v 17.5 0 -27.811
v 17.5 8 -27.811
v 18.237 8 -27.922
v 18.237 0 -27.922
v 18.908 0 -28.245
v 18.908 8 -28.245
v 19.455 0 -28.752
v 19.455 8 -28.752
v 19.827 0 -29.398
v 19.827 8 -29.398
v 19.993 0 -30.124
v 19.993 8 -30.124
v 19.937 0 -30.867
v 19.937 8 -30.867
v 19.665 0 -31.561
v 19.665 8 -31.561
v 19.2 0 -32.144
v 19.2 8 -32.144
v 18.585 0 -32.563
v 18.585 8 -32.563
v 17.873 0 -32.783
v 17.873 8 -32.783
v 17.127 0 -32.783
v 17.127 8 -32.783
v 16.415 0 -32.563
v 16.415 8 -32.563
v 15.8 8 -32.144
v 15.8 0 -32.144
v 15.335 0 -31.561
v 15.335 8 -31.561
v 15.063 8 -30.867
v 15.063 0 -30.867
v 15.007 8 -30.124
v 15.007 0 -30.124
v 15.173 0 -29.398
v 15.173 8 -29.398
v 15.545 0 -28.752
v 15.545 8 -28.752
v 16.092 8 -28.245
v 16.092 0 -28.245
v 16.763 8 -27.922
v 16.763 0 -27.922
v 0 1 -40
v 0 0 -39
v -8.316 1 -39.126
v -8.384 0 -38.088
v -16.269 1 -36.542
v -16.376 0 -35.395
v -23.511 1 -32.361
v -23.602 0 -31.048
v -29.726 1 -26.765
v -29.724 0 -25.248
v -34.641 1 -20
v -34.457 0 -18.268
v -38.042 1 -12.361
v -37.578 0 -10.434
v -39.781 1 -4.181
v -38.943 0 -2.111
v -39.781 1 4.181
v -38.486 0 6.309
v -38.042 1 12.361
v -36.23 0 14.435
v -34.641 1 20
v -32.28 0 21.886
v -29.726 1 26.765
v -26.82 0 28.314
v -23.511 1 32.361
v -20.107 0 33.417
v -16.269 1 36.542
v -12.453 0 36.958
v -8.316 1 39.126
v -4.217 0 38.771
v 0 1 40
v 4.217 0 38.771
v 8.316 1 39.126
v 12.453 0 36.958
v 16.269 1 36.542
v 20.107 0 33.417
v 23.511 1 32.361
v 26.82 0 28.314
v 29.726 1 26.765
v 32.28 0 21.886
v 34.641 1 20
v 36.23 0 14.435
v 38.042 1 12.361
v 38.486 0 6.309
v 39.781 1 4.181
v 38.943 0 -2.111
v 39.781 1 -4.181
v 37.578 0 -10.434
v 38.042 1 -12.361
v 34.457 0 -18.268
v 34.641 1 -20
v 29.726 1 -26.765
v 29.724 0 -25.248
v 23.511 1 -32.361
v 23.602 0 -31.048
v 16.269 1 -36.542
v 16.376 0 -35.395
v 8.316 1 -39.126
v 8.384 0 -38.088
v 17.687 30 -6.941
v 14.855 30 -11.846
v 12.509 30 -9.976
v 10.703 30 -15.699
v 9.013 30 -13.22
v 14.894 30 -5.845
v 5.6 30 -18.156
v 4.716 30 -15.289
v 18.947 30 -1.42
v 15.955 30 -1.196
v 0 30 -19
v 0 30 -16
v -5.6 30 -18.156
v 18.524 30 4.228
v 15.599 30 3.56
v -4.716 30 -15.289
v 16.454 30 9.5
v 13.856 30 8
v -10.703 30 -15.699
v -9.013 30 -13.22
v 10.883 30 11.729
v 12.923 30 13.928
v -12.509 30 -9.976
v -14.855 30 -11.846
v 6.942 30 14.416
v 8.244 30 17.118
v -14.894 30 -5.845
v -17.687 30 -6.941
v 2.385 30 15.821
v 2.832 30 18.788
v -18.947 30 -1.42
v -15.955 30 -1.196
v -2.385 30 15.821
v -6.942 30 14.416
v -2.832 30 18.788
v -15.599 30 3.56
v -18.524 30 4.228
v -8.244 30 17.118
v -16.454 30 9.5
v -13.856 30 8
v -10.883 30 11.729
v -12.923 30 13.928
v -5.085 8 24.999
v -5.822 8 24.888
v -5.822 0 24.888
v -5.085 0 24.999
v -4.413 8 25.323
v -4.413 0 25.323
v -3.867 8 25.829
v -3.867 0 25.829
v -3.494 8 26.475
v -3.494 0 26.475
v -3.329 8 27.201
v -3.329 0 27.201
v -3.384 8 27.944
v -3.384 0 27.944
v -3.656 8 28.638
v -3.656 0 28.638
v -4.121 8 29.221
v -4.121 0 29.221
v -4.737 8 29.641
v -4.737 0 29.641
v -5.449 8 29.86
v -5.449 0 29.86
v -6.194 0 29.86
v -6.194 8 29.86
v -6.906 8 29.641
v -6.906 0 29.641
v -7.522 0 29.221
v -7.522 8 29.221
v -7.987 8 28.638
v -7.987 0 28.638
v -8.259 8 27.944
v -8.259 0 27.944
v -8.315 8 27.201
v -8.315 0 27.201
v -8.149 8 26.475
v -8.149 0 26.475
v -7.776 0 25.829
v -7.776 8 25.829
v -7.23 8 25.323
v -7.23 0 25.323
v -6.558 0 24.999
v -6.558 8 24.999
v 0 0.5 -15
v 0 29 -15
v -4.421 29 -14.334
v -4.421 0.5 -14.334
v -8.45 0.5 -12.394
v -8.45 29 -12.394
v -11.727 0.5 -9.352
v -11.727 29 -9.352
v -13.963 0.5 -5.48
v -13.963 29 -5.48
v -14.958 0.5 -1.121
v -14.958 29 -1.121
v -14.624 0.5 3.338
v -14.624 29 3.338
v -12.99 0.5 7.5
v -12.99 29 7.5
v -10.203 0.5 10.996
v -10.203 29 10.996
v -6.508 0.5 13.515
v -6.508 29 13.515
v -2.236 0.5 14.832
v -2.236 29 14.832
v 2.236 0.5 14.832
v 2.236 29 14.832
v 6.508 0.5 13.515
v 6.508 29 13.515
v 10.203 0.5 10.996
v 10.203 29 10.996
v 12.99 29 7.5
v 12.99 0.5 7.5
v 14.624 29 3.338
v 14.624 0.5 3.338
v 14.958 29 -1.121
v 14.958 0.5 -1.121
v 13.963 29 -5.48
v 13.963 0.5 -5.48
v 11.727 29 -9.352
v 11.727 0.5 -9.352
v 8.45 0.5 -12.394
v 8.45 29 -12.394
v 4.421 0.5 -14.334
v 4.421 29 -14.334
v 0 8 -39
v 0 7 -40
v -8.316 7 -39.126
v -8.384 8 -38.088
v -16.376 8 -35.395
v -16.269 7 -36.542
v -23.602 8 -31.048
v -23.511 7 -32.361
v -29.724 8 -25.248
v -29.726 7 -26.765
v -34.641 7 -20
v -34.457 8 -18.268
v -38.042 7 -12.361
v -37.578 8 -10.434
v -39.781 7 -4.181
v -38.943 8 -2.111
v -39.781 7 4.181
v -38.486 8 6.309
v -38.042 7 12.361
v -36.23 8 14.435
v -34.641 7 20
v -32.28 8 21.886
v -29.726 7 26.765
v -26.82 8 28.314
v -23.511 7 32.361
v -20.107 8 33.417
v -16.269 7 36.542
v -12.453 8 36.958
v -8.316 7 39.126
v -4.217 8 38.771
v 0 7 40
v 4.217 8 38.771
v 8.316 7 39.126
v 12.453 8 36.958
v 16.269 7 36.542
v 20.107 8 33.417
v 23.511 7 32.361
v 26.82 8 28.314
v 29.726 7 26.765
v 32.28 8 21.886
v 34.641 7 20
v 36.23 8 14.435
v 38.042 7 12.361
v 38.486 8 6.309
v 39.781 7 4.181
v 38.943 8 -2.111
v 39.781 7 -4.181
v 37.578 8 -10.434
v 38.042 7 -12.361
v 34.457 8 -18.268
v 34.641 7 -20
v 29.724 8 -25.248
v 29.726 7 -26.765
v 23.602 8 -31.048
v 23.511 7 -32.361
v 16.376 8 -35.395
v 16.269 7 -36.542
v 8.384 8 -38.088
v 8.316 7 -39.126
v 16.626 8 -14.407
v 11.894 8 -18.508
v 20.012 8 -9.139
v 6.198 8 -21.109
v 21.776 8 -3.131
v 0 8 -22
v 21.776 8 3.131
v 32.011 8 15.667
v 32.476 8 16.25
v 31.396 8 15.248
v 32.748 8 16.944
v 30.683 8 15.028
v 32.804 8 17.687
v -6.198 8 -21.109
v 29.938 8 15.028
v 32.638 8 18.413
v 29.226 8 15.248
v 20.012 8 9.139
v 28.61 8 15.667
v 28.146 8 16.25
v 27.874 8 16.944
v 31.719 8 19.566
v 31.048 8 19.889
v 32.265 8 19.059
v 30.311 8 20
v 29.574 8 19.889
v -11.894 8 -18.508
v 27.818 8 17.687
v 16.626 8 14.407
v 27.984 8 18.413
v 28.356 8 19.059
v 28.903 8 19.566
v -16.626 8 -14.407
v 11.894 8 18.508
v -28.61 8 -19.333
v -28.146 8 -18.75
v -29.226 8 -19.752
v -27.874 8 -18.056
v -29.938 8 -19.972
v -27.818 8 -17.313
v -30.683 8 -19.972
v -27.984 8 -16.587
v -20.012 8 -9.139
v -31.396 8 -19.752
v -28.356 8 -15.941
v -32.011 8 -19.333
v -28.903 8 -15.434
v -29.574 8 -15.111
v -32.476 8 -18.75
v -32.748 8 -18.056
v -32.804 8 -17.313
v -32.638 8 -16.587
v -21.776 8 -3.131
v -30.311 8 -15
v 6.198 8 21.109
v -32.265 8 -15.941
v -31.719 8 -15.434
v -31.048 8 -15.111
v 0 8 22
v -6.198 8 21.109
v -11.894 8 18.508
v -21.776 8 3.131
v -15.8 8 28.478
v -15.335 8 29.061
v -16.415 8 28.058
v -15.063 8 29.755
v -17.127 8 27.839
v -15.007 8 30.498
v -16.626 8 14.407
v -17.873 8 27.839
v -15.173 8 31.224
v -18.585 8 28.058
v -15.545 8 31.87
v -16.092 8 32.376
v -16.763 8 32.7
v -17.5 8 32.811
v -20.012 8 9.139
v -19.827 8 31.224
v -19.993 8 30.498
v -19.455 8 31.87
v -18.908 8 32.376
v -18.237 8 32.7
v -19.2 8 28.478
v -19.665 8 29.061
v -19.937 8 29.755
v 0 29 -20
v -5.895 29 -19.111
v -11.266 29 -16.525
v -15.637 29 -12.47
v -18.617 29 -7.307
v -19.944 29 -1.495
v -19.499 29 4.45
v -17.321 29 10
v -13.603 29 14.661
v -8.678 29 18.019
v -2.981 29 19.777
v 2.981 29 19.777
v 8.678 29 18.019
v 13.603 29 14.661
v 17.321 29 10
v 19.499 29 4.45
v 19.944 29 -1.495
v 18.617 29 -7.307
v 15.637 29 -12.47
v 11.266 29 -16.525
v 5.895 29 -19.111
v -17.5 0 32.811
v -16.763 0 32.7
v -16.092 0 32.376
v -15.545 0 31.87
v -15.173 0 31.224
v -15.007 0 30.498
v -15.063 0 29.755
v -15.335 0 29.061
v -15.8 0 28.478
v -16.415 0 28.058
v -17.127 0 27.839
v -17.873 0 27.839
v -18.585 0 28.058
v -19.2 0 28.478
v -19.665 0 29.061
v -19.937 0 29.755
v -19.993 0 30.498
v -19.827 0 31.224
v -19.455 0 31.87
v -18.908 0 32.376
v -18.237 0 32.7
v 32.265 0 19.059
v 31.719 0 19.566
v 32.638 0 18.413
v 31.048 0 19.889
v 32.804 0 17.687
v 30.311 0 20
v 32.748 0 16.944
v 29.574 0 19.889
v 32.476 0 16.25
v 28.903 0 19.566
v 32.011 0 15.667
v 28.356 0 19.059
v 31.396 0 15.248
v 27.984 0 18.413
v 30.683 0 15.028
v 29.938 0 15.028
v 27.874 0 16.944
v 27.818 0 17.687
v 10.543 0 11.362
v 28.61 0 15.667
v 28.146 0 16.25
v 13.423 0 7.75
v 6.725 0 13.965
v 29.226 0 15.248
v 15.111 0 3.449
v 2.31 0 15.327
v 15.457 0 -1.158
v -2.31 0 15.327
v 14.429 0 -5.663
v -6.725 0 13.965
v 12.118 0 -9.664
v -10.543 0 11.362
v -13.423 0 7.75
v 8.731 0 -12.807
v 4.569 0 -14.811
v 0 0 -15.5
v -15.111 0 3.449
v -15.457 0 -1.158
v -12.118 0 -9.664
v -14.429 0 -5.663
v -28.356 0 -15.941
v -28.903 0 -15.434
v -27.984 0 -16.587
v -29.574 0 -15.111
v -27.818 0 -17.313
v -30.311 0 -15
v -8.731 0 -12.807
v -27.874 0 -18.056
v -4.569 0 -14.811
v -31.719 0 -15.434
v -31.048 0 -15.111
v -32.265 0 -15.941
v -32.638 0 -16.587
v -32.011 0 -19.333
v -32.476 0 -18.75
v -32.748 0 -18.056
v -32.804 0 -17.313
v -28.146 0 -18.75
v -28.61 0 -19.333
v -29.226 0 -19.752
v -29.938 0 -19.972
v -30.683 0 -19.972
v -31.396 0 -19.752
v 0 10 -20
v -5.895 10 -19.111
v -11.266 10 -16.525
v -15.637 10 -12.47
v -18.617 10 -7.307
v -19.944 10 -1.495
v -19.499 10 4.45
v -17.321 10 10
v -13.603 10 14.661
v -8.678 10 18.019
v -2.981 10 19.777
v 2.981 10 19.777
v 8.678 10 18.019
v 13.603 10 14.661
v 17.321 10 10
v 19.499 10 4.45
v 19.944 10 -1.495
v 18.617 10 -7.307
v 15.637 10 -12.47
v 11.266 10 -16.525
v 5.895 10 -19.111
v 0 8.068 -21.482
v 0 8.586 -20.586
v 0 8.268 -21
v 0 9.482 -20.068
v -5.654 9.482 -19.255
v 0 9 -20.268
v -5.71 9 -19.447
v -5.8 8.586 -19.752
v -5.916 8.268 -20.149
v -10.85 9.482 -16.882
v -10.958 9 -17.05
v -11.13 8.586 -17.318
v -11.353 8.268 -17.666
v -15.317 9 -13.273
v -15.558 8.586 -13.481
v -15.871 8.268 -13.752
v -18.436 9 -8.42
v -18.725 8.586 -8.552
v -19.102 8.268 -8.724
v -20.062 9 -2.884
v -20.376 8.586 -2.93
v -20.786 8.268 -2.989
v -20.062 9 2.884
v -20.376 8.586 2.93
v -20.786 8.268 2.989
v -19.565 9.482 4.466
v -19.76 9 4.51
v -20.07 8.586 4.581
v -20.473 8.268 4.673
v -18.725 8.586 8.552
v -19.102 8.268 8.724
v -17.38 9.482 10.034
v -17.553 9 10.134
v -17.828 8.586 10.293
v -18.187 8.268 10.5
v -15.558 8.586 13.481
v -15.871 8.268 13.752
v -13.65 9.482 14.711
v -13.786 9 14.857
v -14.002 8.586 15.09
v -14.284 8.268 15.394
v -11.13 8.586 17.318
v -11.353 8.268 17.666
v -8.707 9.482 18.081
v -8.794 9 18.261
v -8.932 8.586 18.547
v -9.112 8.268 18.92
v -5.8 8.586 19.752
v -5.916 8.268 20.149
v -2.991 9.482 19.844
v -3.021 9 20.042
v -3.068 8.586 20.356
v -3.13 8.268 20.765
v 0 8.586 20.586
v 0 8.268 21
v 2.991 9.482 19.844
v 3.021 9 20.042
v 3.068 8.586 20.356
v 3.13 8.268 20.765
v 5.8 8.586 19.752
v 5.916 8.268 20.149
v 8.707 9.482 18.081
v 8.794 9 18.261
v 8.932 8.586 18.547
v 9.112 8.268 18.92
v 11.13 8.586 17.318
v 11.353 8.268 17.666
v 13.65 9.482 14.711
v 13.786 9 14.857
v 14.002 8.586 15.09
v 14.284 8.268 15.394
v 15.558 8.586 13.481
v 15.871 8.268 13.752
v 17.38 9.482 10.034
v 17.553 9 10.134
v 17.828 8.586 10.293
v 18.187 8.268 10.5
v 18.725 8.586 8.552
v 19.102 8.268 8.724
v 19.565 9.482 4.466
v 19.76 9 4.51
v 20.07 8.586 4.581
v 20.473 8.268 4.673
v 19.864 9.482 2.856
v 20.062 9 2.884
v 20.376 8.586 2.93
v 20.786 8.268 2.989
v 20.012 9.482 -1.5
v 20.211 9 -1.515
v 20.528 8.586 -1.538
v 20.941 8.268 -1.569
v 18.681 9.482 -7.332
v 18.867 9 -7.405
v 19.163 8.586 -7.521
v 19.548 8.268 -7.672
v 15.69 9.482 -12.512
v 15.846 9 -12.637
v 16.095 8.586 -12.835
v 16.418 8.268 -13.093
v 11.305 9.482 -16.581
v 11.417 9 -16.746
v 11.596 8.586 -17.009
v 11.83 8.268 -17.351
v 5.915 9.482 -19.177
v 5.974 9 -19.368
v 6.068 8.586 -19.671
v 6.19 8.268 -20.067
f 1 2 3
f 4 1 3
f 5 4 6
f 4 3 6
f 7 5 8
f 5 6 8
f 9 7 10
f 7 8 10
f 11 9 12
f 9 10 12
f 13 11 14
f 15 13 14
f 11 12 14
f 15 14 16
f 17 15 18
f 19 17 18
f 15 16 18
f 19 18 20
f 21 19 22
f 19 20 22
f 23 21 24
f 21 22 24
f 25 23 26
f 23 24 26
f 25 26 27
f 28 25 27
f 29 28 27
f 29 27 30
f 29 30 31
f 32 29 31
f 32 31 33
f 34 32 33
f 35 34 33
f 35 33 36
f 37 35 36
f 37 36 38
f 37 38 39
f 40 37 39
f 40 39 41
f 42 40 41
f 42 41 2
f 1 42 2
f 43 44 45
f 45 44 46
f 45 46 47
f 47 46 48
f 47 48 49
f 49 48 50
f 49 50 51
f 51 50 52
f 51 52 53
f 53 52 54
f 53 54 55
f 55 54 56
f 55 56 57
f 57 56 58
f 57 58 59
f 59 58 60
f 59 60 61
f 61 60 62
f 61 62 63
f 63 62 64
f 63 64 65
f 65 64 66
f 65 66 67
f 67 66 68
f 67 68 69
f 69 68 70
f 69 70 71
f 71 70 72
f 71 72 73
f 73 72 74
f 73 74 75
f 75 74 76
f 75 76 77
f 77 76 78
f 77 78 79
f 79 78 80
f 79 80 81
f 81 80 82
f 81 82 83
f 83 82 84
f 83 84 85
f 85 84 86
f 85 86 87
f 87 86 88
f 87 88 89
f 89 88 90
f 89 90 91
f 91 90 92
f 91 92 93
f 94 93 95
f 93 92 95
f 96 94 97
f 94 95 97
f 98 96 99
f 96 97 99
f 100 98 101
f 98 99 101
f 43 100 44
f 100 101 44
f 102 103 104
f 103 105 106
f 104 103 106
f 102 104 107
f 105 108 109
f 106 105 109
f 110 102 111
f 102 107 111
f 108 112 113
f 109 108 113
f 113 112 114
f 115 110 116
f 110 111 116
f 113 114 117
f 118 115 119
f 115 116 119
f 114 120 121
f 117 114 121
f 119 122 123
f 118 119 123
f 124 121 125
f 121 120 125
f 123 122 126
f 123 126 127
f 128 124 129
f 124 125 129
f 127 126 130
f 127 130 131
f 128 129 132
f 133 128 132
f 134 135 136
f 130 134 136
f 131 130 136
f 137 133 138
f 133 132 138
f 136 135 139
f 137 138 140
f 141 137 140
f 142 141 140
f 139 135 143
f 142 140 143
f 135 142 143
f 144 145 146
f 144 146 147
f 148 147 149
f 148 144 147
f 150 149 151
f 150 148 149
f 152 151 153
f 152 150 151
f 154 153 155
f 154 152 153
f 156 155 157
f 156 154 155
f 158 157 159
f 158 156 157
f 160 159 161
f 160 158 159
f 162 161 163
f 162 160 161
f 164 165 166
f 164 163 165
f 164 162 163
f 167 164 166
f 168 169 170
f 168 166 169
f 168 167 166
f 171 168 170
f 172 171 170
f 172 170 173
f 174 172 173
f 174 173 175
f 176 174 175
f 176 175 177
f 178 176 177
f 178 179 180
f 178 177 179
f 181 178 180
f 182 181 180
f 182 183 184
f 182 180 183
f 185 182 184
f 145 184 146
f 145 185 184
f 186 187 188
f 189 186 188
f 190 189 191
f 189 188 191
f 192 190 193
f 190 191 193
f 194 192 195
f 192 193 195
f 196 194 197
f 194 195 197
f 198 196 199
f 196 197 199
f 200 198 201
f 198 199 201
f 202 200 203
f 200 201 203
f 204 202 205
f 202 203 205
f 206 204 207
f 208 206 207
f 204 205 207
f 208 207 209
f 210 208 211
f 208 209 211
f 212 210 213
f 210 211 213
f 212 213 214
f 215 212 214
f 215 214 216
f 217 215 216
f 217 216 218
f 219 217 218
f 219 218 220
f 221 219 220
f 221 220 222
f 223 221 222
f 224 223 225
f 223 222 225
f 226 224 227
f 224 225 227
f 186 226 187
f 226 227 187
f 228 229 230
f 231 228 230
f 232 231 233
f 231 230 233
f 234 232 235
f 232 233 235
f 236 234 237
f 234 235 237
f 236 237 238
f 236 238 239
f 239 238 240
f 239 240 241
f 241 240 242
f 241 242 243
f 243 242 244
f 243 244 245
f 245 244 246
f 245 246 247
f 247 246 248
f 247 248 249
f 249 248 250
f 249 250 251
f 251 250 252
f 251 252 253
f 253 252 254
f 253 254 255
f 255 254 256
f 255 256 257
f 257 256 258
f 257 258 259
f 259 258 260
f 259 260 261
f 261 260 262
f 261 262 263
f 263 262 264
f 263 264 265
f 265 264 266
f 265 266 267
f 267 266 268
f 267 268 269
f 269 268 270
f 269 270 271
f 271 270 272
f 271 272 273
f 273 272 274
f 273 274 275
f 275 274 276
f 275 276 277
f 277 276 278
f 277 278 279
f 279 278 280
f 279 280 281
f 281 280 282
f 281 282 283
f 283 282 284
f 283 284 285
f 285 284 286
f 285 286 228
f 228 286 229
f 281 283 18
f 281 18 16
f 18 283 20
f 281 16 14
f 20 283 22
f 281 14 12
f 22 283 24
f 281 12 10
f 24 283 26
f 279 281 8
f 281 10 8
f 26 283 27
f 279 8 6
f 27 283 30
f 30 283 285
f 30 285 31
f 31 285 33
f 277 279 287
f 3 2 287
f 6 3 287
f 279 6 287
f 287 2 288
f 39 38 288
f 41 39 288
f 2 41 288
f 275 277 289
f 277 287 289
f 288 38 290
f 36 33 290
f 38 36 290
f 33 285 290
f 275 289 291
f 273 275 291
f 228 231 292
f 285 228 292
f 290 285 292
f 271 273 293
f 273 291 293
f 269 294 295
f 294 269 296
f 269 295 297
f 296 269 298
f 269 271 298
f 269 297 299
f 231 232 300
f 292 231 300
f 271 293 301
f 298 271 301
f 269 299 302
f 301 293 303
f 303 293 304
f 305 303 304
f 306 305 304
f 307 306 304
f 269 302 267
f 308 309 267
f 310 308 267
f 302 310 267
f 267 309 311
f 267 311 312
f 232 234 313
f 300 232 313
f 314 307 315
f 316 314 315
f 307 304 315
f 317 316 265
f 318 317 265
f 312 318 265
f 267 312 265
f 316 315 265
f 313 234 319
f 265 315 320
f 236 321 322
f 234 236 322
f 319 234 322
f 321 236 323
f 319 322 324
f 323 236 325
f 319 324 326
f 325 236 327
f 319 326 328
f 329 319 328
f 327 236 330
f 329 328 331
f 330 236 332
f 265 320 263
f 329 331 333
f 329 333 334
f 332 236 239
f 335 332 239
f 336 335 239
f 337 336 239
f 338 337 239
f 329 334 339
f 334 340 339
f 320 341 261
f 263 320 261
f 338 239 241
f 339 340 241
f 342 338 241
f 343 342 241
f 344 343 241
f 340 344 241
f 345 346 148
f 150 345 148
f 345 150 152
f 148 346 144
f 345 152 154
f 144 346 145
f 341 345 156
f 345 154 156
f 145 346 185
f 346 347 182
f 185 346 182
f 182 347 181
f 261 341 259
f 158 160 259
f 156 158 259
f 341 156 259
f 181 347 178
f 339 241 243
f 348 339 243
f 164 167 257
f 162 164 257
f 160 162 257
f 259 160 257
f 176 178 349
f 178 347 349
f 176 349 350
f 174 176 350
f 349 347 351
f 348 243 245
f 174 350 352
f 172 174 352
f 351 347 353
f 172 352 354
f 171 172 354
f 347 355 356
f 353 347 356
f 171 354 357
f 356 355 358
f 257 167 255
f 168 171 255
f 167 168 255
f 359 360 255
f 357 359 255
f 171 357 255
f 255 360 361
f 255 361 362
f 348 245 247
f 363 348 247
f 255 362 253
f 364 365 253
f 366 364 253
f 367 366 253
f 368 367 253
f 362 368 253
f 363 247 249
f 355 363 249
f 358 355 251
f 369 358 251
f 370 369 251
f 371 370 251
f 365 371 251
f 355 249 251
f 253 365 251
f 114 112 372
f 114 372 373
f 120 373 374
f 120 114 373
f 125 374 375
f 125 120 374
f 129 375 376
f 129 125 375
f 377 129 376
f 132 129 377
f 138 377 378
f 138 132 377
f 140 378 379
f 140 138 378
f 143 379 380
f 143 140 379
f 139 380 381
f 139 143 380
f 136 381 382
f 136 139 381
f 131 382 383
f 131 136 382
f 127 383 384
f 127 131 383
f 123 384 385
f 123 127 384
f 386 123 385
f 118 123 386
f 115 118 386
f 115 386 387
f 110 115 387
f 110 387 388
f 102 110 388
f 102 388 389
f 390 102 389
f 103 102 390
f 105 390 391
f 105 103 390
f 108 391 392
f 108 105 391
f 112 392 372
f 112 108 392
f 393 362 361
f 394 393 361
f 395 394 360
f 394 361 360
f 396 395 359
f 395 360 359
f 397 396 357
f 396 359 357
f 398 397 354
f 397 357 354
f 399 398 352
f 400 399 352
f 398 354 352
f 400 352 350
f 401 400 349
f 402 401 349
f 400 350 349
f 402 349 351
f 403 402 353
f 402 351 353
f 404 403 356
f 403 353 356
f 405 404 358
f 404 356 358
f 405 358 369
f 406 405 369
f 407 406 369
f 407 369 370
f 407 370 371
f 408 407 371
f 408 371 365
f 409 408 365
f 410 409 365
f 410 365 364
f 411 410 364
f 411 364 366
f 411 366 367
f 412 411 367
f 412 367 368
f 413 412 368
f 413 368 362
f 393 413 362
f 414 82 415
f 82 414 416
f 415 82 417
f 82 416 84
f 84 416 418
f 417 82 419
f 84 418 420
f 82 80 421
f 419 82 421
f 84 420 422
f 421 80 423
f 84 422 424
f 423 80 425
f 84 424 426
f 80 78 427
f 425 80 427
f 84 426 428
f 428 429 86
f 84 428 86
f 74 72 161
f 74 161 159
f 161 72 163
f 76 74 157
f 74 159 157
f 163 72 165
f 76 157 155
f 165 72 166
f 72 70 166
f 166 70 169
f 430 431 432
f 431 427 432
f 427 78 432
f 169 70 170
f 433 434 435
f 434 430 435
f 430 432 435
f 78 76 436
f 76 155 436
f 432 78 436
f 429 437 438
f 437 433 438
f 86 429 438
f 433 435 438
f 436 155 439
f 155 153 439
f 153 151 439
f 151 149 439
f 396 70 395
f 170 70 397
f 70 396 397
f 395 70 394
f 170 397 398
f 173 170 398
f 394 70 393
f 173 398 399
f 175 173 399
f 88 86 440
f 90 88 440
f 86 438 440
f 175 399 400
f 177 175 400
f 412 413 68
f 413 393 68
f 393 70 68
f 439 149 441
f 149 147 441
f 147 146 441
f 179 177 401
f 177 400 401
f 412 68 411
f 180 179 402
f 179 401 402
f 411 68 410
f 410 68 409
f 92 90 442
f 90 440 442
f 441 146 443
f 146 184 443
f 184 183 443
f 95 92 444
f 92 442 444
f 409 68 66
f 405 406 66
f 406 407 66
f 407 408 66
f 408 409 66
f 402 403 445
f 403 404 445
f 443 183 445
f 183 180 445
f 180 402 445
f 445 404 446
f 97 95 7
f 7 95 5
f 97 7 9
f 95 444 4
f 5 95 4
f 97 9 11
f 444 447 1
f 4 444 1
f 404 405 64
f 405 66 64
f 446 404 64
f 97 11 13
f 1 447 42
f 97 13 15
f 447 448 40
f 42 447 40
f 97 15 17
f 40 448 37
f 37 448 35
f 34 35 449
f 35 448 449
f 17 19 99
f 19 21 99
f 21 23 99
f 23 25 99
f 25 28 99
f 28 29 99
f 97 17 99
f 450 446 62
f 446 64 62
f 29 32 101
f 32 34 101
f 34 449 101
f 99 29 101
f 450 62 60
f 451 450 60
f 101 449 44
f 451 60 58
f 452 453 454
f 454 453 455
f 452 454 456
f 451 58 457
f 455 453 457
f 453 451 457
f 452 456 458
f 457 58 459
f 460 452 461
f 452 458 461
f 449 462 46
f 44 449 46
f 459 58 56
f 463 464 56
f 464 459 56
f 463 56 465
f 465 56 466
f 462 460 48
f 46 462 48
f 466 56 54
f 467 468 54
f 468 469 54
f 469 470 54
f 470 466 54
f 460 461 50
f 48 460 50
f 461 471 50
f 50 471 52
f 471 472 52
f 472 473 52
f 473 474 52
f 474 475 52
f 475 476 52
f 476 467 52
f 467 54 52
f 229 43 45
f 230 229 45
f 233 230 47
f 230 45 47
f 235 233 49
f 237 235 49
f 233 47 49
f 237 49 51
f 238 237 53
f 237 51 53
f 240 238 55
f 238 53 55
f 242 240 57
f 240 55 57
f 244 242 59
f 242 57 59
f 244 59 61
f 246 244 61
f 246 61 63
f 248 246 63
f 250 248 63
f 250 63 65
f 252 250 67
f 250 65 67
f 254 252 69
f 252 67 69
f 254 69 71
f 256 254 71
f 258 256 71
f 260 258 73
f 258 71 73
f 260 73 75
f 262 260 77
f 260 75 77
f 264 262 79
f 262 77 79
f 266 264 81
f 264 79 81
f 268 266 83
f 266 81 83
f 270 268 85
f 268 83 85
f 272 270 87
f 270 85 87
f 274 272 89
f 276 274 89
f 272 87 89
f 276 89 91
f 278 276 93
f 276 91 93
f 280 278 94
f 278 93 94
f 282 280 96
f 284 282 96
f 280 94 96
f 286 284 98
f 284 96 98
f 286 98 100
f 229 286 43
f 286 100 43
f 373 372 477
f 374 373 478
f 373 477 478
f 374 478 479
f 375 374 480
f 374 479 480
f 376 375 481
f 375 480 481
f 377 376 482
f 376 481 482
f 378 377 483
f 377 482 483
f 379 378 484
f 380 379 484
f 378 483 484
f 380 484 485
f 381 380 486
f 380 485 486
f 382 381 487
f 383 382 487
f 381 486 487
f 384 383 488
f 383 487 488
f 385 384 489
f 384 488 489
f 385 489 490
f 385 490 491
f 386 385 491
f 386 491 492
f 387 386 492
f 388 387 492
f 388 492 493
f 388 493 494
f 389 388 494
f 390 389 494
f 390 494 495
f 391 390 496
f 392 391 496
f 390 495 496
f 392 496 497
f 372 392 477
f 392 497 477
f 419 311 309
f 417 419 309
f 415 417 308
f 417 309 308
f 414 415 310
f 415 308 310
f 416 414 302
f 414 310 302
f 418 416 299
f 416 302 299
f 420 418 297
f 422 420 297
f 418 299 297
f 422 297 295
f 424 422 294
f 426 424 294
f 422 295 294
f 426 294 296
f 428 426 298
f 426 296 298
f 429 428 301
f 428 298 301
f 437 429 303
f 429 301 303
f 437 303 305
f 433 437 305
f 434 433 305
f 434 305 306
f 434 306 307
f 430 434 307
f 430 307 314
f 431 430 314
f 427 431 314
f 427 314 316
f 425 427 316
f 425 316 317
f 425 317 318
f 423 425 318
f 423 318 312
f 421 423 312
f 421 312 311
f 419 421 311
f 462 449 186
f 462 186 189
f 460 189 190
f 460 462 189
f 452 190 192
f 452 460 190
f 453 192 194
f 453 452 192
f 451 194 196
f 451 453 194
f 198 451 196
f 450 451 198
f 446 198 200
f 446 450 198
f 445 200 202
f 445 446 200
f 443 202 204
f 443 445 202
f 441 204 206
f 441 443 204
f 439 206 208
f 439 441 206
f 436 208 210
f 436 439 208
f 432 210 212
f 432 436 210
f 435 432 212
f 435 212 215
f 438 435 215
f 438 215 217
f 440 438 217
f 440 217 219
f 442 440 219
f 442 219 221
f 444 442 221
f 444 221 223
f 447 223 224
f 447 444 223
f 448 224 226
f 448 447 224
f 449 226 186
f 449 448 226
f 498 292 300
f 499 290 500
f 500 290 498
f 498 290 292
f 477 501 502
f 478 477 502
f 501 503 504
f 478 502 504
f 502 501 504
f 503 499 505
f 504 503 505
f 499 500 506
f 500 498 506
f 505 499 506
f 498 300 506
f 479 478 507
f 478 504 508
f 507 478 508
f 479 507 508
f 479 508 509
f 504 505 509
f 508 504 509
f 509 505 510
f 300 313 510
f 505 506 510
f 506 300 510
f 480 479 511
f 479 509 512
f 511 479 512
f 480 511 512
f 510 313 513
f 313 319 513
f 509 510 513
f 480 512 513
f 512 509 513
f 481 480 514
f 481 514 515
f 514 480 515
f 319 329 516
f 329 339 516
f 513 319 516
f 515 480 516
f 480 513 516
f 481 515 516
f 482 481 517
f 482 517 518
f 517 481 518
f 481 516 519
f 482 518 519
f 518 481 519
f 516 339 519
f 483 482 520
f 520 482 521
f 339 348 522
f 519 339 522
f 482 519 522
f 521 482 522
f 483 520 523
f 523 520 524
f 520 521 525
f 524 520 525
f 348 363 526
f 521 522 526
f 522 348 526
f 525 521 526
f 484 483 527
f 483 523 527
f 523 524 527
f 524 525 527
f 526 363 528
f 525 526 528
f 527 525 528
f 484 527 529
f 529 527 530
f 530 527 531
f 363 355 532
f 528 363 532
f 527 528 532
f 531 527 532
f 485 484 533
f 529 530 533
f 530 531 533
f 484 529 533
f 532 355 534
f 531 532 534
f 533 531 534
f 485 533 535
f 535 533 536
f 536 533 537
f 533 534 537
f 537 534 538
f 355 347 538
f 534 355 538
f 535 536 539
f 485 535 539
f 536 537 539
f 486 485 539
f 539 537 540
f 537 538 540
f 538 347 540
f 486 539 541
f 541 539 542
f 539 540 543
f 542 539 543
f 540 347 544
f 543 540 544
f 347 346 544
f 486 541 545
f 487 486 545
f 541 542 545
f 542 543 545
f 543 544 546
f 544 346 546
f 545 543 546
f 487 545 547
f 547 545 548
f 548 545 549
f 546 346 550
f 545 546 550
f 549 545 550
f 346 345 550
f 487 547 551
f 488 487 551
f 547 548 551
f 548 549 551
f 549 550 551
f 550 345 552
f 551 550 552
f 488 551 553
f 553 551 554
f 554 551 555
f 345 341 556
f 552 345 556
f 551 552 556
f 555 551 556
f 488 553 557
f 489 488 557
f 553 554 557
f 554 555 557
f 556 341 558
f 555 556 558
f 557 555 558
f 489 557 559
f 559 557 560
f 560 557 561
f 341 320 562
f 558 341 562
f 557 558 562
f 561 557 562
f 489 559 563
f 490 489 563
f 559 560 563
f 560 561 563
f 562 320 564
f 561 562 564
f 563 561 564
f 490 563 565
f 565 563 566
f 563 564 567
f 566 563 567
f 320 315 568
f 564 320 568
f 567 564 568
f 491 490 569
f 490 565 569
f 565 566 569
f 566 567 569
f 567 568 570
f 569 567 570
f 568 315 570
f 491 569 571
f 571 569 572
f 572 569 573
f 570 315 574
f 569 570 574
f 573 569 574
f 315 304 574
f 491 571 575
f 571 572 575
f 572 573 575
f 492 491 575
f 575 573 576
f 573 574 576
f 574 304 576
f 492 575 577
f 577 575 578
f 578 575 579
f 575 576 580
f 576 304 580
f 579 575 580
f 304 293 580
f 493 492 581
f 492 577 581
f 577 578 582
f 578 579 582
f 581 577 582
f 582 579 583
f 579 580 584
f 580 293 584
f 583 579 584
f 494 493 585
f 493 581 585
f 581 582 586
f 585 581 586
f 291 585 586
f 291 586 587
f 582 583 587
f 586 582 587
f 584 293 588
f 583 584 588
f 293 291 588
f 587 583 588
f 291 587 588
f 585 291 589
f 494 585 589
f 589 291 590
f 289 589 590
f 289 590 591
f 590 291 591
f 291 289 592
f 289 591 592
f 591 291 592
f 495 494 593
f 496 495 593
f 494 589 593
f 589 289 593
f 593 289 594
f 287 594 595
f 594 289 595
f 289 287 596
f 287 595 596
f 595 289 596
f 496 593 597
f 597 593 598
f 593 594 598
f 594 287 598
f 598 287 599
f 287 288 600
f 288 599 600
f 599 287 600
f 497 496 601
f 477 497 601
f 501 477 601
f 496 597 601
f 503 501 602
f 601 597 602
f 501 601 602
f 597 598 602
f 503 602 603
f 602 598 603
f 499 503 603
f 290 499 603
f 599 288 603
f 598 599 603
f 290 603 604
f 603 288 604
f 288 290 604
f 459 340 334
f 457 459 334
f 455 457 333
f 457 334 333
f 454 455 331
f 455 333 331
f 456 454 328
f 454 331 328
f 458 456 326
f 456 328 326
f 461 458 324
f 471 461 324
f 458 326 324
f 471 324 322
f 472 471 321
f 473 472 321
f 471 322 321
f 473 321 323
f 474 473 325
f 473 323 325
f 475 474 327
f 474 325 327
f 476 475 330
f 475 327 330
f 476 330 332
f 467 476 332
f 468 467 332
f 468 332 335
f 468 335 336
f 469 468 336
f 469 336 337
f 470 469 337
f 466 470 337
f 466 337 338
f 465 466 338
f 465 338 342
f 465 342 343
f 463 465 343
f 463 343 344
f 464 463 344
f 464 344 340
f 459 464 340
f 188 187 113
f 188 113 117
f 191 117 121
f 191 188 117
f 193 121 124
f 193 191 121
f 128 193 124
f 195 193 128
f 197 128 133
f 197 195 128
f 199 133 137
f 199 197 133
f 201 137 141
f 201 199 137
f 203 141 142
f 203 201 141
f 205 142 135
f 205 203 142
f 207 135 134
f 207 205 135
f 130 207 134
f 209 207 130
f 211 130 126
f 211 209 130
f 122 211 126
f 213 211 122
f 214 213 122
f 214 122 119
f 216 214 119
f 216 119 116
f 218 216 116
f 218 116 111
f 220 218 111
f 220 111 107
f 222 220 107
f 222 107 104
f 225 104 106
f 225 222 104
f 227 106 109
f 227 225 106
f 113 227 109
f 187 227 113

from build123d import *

# Parameters (mm, degrees)
FILLET1_R               = 2
CHAMFER1_SIZE           = 1
CHAMFER2_SIZE           = 0.5
CUT_EXTRUDE1_DEPTH      = 65.031242374
CUT_EXTRUDE1_DEPTH_BACK = 65.031242374
SKETCH2_R               = 2.5
CUT_EXTRUDE3_REACH      = 62.696
SKETCH5_R               = 2.5


with BuildPart() as part:
    # Sketch1 → Revolve1 (revolve)
    with BuildSketch(Plane.XY, mode=Mode.PRIVATE) as revolve1_sk:
        Polygon((-15, 0), (-15, 30), (-20, 30), (-20, 8), (-40, 8), (-40, 0), align=None)
    revolve(revolve1_sk.sketch.rotate(Axis((0, 0, 0), (0, 1, 0)), 270), axis=Axis((0, 0, 0), (0, 1, 0)))

    # Fillet1
    fillet1_edges = [part.edges().sort_by_distance(p)[0] for p in [
        (0, 8, 20),
    ]]
    fillet(fillet1_edges, radius=FILLET1_R)

    # Chamfer1
    chamfer1_edges = [part.edges().sort_by_distance(p)[0] for p in [
        (0, 0, 40),
        (0, 8, 40),
        (0, 30, 20),
        (0, 30, 15),
    ]]
    chamfer(chamfer1_edges, length=CHAMFER1_SIZE)

    # Chamfer2
    chamfer2_edges = [part.edges().sort_by_distance(p)[0] for p in [
        (0, 0, 15),
    ]]
    chamfer(chamfer2_edges, length=CHAMFER2_SIZE)

    # Sketch2 → Cut-Extrude1 (cut, two sides: drawn at the far end of the back side and taken through both)
    with BuildSketch(Plane.XZ.offset(-CUT_EXTRUDE1_DEPTH_BACK)):
        with Locations(Location((-5.821527343, 27.388132821, 0), (0, 0, 270))):
            Circle(SKETCH2_R)
    extrude(amount=CUT_EXTRUDE1_DEPTH + CUT_EXTRUDE1_DEPTH_BACK, mode=Mode.SUBTRACT)

    # Sketch5 → Cut-Extrude3 (cut, up to next)
    with BuildSketch(Plane(origin=(0, 8, 0), x_dir=(1, 0, 0), z_dir=(0, 1, 0)), mode=Mode.PRIVATE) as cut_extrude3_sk1:
        with Locations(Location((-17.5, -30.310889132, 0), (0, 0, 270))):
            Circle(SKETCH5_R)
    cut_extrude3_tool1 = extrude(cut_extrude3_sk1.sketch, amount=-CUT_EXTRUDE3_REACH, mode=Mode.PRIVATE) & part.part
    # Sketch5 → Cut-Extrude3 (cut, up to next)
    with BuildSketch(Plane(origin=(0, 8, 0), x_dir=(1, 0, 0), z_dir=(0, 1, 0)), mode=Mode.PRIVATE) as cut_extrude3_sk2:
        with Locations(Location((-30.310889132, 17.5, 0), (0, 0, 270))):
            Circle(SKETCH5_R)
    cut_extrude3_tool2 = extrude(cut_extrude3_sk2.sketch, amount=-CUT_EXTRUDE3_REACH, mode=Mode.PRIVATE) & part.part
    # Sketch5 → Cut-Extrude3 (cut, up to next)
    with BuildSketch(Plane(origin=(0, 8, 0), x_dir=(1, 0, 0), z_dir=(0, 1, 0)), mode=Mode.PRIVATE) as cut_extrude3_sk3:
        with Locations(Location((17.5, 30.310889132, 0), (0, 0, 270))):
            Circle(SKETCH5_R)
    cut_extrude3_tool3 = extrude(cut_extrude3_sk3.sketch, amount=-CUT_EXTRUDE3_REACH, mode=Mode.PRIVATE) & part.part
    # Sketch5 → Cut-Extrude3 (cut, up to next)
    with BuildSketch(Plane(origin=(0, 8, 0), x_dir=(1, 0, 0), z_dir=(0, 1, 0)), mode=Mode.PRIVATE) as cut_extrude3_sk4:
        with Locations(Location((30.310889132, -17.5, 0), (0, 0, 270))):
            Circle(SKETCH5_R)
    cut_extrude3_tool4 = extrude(cut_extrude3_sk4.sketch, amount=-CUT_EXTRUDE3_REACH, mode=Mode.PRIVATE) & part.part
    add(cut_extrude3_tool1.solids().sort_by_distance((-17.5, 8, 30.310889))[0], mode=Mode.SUBTRACT)
    add(cut_extrude3_tool2.solids().sort_by_distance((-30.310889, 8, -17.5))[0], mode=Mode.SUBTRACT)
    add(cut_extrude3_tool3.solids().sort_by_distance((17.5, 8, -30.310889))[0], mode=Mode.SUBTRACT)
    add(cut_extrude3_tool4.solids().sort_by_distance((30.310889, 8, 17.5))[0], mode=Mode.SUBTRACT)


solid = part.part
